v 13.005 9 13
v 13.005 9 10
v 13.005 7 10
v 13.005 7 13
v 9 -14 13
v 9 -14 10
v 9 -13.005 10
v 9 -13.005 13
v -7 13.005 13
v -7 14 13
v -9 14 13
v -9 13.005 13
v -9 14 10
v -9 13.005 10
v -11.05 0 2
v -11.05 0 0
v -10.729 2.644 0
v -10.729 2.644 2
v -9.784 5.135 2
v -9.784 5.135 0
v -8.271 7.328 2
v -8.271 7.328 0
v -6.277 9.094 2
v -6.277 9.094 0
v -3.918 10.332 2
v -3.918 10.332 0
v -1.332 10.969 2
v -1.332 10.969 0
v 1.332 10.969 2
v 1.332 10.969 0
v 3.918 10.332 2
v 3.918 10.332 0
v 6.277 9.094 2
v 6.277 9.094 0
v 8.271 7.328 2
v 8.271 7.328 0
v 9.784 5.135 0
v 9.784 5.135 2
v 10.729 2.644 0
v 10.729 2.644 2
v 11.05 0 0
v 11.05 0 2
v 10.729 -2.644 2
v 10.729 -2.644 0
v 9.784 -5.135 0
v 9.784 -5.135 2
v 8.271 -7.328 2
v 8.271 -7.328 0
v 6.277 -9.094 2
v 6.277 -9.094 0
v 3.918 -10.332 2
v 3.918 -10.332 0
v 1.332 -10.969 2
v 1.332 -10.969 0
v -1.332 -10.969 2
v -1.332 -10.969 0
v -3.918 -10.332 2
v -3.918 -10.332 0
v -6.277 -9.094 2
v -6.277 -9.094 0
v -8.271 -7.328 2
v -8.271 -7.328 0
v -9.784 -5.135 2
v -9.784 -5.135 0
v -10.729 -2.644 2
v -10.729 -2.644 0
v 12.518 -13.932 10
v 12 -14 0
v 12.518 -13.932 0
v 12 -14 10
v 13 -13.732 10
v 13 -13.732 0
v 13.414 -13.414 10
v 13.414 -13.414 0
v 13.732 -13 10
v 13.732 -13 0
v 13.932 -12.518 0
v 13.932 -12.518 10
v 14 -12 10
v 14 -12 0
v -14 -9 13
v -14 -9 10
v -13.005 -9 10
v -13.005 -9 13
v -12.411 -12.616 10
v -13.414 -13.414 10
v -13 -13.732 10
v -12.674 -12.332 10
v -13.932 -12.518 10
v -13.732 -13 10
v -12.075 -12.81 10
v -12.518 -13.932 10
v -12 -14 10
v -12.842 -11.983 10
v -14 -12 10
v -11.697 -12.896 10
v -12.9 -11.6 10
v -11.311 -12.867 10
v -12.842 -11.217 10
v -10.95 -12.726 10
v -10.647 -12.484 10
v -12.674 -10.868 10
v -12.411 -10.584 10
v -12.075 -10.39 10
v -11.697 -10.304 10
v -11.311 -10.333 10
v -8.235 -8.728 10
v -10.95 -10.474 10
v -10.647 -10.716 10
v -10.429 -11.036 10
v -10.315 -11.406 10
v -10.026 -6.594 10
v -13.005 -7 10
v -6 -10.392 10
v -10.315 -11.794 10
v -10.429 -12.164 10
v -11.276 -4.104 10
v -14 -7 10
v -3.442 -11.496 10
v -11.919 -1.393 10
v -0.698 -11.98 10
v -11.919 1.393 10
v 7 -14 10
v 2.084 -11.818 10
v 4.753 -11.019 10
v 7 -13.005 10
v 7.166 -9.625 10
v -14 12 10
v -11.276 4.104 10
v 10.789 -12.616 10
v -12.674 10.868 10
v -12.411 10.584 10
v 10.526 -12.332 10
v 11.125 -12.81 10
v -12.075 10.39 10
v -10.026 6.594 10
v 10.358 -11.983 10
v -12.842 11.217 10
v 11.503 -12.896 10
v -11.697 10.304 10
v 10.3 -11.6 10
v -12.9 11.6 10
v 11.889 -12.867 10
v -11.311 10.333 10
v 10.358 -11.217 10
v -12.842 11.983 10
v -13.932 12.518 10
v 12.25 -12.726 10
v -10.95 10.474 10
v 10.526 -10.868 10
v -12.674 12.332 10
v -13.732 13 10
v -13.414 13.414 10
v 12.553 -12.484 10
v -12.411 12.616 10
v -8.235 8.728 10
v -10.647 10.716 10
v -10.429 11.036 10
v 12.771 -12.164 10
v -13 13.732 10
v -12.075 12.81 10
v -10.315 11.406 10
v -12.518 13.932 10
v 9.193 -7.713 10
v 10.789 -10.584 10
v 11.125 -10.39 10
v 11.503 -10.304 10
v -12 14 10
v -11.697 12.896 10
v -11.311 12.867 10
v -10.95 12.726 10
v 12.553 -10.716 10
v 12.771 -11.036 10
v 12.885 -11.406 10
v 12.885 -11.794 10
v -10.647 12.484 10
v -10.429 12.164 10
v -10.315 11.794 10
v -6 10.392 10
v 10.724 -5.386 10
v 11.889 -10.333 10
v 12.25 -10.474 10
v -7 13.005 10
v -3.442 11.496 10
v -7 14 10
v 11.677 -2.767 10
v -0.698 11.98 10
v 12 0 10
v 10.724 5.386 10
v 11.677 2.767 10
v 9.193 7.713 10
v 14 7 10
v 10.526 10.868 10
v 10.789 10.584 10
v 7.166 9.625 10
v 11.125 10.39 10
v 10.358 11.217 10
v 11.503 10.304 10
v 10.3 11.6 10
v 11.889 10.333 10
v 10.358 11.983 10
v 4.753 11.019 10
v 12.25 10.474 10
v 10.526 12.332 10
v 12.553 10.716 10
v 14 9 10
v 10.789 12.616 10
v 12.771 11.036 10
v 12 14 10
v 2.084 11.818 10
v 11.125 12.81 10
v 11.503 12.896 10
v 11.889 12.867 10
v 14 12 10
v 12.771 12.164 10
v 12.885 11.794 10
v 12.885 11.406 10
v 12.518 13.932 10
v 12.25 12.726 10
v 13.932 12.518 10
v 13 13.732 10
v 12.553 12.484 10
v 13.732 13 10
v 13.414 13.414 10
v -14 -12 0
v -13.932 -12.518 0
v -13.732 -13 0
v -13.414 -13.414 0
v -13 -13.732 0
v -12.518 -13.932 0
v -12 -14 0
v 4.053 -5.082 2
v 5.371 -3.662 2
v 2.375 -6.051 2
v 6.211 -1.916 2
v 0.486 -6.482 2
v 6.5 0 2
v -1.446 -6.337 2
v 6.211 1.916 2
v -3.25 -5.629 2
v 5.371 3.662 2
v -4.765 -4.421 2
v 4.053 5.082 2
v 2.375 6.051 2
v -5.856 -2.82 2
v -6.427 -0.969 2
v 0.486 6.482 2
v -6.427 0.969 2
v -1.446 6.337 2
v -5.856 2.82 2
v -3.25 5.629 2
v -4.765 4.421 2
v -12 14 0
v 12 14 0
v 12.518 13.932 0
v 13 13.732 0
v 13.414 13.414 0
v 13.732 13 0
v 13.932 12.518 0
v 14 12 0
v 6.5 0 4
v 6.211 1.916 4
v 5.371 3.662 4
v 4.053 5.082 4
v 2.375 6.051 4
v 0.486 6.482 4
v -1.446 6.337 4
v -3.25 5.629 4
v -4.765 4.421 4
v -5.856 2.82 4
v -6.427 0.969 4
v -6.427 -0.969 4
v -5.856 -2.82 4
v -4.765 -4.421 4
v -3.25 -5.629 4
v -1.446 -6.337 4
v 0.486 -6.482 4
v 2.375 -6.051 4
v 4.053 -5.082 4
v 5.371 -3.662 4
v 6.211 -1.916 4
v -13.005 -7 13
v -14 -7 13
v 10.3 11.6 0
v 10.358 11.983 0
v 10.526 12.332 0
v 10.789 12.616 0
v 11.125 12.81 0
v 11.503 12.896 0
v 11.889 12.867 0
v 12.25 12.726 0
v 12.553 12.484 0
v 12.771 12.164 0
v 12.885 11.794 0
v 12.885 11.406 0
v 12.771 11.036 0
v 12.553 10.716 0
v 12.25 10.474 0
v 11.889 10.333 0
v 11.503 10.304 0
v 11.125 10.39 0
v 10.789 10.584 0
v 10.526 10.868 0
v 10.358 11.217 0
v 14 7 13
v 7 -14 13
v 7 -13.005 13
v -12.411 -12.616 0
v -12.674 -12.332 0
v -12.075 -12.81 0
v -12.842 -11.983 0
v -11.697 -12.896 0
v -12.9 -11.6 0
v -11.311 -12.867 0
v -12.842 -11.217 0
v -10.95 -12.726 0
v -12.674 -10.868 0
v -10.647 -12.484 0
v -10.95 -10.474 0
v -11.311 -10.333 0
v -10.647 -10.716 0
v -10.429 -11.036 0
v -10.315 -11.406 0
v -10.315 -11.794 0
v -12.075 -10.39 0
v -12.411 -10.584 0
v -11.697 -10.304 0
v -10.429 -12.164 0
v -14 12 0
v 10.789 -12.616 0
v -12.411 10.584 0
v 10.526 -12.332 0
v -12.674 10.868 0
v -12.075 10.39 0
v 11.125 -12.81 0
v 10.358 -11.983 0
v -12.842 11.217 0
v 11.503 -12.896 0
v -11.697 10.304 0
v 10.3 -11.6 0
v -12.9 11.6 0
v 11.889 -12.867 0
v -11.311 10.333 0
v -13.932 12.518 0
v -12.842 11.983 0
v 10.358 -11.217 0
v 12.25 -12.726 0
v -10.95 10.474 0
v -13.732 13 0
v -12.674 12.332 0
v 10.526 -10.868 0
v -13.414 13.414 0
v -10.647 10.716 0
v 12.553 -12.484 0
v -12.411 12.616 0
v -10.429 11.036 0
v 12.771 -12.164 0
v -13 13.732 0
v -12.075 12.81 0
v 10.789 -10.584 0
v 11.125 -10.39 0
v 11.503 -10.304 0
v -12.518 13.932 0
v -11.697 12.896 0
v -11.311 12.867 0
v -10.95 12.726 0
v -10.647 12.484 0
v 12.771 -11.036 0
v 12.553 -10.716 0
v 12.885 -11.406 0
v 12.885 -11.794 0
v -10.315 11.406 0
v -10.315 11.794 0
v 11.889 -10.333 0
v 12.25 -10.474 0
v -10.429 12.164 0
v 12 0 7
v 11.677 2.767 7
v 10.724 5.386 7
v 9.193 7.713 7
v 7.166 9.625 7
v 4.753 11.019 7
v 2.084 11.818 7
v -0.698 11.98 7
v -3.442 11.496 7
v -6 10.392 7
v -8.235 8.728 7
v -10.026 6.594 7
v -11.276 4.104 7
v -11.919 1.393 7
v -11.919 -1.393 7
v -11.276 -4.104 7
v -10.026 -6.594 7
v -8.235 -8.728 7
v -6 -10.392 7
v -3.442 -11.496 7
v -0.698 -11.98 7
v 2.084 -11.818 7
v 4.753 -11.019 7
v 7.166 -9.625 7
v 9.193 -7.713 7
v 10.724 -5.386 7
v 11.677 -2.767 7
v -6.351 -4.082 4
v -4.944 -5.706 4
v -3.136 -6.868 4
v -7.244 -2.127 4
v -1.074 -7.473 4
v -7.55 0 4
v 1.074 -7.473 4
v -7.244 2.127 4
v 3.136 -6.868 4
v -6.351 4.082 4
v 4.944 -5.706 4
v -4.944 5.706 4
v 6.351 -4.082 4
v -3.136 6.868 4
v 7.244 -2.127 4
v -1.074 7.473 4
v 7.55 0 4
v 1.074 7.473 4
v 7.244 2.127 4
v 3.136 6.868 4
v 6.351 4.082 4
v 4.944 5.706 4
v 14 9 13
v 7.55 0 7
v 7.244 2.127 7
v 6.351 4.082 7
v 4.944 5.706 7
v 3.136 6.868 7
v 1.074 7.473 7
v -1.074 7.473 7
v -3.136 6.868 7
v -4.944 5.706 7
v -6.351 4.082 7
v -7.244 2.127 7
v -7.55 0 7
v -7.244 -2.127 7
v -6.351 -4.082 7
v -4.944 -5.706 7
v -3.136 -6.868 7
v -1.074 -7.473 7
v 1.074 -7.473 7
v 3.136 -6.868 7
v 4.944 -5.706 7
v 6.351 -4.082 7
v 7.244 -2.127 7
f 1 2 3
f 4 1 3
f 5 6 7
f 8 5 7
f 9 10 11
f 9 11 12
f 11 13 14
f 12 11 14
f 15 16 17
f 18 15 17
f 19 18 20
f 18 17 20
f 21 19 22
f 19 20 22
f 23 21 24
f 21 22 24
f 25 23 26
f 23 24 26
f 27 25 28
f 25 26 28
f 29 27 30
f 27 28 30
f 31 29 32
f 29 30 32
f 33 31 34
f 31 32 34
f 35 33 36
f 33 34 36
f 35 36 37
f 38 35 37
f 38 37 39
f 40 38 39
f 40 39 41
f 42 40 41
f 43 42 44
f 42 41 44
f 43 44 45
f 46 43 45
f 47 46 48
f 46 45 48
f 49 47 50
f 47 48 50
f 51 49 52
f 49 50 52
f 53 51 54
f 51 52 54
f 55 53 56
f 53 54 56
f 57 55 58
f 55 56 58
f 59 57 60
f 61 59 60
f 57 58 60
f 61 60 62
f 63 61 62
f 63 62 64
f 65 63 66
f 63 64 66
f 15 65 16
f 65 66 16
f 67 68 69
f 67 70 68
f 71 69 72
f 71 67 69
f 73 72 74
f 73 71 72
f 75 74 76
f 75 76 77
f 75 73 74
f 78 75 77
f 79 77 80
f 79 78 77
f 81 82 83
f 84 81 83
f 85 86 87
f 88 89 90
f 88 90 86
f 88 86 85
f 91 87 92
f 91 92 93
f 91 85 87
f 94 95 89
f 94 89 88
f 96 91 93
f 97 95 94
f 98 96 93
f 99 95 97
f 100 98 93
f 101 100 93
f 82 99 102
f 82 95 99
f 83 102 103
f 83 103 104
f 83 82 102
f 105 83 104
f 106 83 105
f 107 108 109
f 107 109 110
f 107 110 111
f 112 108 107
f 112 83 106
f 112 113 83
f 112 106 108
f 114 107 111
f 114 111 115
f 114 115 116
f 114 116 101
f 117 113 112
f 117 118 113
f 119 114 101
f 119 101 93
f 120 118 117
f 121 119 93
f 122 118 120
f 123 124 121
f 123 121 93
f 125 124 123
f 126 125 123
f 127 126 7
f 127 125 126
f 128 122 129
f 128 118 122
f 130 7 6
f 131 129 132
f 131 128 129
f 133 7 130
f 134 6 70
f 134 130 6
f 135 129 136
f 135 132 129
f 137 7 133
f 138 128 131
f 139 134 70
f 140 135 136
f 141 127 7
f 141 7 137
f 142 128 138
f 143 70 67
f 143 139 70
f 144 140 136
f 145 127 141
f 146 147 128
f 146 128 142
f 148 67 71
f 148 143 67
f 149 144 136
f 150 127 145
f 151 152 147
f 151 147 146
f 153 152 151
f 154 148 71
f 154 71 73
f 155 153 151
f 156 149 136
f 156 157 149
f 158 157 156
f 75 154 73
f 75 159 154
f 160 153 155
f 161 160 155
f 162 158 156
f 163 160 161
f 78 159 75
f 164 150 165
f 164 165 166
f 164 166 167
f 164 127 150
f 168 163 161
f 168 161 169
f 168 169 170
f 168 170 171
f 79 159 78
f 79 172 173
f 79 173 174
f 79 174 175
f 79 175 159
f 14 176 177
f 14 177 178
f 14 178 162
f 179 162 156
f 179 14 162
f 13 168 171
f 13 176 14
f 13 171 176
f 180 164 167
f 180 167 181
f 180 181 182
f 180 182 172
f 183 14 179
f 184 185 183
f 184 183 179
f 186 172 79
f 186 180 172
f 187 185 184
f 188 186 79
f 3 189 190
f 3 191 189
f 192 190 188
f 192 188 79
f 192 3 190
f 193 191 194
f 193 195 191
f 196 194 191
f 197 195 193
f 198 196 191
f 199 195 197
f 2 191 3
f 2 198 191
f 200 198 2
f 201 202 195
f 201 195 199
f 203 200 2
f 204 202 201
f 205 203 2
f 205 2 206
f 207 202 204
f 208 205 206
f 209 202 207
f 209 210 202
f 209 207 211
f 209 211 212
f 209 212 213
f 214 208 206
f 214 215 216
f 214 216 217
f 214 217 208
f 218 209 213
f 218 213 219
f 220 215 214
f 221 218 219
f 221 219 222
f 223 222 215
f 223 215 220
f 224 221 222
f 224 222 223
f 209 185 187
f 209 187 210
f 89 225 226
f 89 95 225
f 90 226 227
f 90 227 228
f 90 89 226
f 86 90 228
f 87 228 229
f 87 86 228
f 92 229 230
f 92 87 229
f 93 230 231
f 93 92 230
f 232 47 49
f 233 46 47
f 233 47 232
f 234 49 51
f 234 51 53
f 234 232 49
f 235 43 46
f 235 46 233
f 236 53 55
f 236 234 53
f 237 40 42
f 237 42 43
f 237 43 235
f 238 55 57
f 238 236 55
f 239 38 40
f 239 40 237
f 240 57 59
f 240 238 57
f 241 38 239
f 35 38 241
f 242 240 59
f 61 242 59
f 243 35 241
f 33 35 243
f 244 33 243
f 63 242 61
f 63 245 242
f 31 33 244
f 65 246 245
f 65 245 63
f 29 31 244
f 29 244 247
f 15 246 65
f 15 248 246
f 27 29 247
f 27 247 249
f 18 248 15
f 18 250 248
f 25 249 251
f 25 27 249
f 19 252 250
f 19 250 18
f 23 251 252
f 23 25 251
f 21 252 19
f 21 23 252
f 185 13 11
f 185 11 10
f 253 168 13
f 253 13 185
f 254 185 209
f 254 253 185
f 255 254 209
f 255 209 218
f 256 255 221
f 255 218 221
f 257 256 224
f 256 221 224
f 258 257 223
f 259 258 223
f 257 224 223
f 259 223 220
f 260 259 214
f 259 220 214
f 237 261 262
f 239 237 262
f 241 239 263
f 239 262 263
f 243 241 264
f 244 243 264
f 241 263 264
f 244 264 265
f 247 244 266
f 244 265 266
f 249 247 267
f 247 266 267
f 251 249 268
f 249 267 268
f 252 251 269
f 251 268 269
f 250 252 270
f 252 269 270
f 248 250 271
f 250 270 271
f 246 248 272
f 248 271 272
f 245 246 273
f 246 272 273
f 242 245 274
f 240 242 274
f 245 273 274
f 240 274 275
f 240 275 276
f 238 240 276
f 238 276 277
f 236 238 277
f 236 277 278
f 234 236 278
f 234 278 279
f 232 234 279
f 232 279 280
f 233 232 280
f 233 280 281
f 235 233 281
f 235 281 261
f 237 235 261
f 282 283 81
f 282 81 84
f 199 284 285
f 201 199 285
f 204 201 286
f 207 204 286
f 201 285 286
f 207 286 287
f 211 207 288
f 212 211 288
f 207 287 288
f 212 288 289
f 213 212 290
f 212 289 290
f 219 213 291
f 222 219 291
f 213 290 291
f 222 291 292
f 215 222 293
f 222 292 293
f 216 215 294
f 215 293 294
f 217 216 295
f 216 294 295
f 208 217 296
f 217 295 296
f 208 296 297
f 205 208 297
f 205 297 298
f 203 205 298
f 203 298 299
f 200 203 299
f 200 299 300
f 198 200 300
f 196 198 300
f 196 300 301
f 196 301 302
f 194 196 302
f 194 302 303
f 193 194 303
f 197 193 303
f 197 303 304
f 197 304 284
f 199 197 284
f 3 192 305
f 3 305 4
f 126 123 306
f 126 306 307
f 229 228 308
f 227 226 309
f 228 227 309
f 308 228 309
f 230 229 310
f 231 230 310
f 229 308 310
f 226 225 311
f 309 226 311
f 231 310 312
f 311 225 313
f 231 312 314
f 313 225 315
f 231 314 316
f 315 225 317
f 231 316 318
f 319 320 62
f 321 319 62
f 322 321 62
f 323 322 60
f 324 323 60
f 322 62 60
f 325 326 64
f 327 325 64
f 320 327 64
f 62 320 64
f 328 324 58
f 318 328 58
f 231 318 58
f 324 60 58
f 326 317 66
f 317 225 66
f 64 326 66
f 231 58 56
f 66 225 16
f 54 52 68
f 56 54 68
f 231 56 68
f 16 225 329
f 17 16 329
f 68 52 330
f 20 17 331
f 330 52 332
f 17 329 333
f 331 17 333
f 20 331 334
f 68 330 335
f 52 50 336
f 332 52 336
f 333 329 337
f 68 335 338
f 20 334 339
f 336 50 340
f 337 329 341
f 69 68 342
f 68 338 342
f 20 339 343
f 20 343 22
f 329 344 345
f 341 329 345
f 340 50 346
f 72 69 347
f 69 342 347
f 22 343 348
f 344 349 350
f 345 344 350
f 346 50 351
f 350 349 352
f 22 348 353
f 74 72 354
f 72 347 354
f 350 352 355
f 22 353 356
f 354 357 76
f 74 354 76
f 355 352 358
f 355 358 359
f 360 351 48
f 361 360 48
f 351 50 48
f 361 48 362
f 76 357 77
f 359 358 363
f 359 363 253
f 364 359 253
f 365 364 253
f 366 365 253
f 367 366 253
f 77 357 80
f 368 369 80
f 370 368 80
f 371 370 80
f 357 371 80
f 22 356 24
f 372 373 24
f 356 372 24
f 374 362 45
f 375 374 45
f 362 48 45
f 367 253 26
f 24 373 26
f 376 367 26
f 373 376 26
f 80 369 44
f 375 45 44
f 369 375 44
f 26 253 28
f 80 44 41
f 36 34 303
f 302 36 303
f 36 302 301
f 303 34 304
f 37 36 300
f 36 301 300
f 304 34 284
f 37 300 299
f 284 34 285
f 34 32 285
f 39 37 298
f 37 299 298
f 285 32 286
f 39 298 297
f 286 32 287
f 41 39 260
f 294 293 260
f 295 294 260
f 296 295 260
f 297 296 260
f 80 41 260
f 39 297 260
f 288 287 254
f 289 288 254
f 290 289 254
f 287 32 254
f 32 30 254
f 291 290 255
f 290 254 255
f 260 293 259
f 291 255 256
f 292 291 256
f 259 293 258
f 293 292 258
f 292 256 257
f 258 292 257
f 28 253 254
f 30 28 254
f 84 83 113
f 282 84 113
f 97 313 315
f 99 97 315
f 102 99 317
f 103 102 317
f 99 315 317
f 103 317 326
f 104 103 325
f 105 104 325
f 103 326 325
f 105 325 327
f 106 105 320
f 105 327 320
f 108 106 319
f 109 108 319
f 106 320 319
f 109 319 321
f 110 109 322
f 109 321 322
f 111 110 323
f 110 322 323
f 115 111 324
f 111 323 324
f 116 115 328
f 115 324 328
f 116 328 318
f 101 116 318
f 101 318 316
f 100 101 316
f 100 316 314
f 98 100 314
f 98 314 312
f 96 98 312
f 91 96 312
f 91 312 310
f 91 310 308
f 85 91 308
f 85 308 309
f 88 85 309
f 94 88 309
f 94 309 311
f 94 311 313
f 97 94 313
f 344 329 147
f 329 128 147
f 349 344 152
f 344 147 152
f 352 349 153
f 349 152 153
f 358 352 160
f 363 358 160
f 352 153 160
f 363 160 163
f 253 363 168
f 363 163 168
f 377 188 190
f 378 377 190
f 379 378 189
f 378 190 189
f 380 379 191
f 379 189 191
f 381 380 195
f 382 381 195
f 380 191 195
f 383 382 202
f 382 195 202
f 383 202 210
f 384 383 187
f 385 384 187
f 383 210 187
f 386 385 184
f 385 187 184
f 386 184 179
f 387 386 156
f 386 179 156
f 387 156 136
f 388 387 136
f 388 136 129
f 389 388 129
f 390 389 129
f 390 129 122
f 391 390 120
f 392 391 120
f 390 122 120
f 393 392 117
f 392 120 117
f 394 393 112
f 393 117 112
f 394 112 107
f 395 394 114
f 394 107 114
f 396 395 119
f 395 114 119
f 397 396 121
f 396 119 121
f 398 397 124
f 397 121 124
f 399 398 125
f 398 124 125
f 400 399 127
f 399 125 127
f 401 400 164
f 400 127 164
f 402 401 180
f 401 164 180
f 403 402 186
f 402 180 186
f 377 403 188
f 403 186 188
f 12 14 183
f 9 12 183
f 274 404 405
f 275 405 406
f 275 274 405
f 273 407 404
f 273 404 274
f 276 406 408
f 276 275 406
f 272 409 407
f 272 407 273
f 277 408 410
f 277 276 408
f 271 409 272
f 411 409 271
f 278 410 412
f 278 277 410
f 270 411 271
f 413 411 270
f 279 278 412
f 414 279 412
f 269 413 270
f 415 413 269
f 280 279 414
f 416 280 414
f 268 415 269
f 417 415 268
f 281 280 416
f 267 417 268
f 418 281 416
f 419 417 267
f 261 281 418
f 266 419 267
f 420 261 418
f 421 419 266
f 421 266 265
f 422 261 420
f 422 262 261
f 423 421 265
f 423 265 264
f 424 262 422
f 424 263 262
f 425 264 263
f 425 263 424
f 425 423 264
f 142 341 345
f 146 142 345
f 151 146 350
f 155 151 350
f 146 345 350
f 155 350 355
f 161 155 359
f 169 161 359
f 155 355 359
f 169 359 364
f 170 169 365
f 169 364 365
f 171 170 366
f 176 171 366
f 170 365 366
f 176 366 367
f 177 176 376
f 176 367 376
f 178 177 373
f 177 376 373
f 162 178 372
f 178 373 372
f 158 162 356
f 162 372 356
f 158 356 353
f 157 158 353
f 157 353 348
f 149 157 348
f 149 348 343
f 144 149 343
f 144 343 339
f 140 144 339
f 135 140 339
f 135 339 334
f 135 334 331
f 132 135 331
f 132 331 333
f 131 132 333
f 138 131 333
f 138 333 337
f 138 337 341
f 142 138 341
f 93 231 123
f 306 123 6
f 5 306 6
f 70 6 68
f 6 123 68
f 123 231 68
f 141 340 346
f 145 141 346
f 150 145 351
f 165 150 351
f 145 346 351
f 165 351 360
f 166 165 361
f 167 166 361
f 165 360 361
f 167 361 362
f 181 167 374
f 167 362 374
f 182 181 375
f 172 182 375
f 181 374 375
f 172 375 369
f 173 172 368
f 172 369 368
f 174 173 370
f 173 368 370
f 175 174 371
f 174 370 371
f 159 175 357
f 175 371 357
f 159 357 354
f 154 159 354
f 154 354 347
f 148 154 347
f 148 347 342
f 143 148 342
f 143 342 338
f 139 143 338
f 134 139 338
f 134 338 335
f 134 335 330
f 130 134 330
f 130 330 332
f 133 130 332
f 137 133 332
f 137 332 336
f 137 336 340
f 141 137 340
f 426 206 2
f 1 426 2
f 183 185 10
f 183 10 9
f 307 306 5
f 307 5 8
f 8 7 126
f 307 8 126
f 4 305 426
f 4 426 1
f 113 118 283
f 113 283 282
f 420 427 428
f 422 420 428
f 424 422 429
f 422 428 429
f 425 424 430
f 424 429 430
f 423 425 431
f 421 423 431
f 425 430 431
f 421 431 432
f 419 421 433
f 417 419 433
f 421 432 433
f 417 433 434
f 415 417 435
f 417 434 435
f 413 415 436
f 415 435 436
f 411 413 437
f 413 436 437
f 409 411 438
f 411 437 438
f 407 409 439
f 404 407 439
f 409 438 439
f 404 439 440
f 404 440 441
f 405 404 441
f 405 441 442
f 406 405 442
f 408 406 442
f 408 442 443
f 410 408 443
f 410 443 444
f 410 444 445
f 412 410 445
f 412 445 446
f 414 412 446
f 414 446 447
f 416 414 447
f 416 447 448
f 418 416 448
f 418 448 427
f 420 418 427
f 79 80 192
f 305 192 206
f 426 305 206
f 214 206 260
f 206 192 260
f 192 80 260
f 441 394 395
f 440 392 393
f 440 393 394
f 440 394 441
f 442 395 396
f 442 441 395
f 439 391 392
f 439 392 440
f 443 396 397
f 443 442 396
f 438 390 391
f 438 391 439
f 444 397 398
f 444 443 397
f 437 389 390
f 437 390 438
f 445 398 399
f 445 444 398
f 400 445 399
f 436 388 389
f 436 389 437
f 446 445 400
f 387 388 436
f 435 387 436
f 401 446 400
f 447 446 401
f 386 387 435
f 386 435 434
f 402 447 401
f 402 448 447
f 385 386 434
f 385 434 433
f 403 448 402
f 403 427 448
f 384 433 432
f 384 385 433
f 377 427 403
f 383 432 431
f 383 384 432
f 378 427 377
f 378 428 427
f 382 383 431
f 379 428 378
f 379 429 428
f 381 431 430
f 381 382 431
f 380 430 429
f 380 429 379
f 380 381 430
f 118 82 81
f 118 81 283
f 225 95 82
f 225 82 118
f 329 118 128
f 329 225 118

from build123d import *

# Parameters (mm, degrees)
SKETCH_1_W               = 28
SKETCH_1_H               = 28
EXTRUDE_1_DEPTH          = 10
SKETCH_2_R               = 6.5
CUT_EXTRUDE_1_DEPTH      = 11
SKETCH_3_R               = 7.55
CUT_EXTRUDE_2_DEPTH      = 6
SKETCH_6_R               = 11.05
CUT_EXTRUDE_3_DEPTH      = 2
FILLET_1_R               = 2
SKETCH_7_W               = 0.995329216
SKETCH_7_H               = 2
EXTRUDE_2_DEPTH          = 3
PATTERN_CIRCULAR_1_COUNT = 4
SKETCH_8_R               = 12
CUT_EXTRUDE_4_DEPTH      = 3
SKETCH_9_R               = 1.3
CUT_EXTRUDE_5_DEPTH      = 14


with BuildPart() as part:
    # 草图1 → 凸台-拉伸1 (new body)
    with BuildSketch(Plane.XY):
        Rectangle(SKETCH_1_W, SKETCH_1_H)
    extrude(amount=EXTRUDE_1_DEPTH)

    # 草图2 → 切除-拉伸1 (cut, through all)
    with BuildSketch(Plane.XY.offset(10)):
        Circle(SKETCH_2_R)
    extrude(amount=-CUT_EXTRUDE_1_DEPTH, mode=Mode.SUBTRACT)

    # 草图3 → 切除-拉伸2 (cut)
    with BuildSketch(Plane.XY.offset(10)):
        Circle(SKETCH_3_R)
    extrude(amount=-CUT_EXTRUDE_2_DEPTH, mode=Mode.SUBTRACT)

    # 草图6 → 切除-拉伸3 (cut)
    with BuildSketch(Plane(origin=(0, 0, 0), x_dir=(-1, 0, 0), z_dir=(0, 0, -1))):
        Circle(SKETCH_6_R)
    extrude(amount=-CUT_EXTRUDE_3_DEPTH, mode=Mode.SUBTRACT)

    # 圆角1
    fillet_1_edges = [part.edges().sort_by_distance(p)[0] for p in [
        (14, -14, 5),
        (-14, -14, 5),
        (-14, 14, 5),
        (14, 14, 5),
    ]]
    fillet(fillet_1_edges, radius=FILLET_1_R)

    # 草图7 → 凸台-拉伸2 (add)
    with BuildSketch(Plane.XY.offset(10)):
        with Locations((-13.502335392, -8)):
            Rectangle(SKETCH_7_W, SKETCH_7_H)
    extrude_2 = extrude(amount=EXTRUDE_2_DEPTH)

    # 阵列(圆周)1: 凸台-拉伸2 ×4 about axis
    pattern_circular_1_axis = Axis((0, 0, 0), (0, 0, 1))
    for i in range(1, PATTERN_CIRCULAR_1_COUNT):
        add(extrude_2.rotate(pattern_circular_1_axis, i * 360 / PATTERN_CIRCULAR_1_COUNT))

    # 草图8 → 切除-拉伸4 (cut)
    with BuildSketch(Plane.XY.offset(10)):
        Circle(SKETCH_8_R)
    extrude(amount=-CUT_EXTRUDE_4_DEPTH, mode=Mode.SUBTRACT)

    # 草图9 → 切除-拉伸5 (cut, through all)
    with BuildSketch(Plane(origin=(0, 0, 0), x_dir=(-1, 0, 0), z_dir=(0, 0, -1))):
        with Locations((-11.6, 11.6)):
            Circle(SKETCH_9_R)
        with Locations((11.6, 11.6)):
            Circle(SKETCH_9_R)
        with Locations((11.6, -11.6)):
            Circle(SKETCH_9_R)
        with Locations((-11.6, -11.6)):
            Circle(SKETCH_9_R)
    extrude(amount=-CUT_EXTRUDE_5_DEPTH, mode=Mode.SUBTRACT)


solid = part.part
